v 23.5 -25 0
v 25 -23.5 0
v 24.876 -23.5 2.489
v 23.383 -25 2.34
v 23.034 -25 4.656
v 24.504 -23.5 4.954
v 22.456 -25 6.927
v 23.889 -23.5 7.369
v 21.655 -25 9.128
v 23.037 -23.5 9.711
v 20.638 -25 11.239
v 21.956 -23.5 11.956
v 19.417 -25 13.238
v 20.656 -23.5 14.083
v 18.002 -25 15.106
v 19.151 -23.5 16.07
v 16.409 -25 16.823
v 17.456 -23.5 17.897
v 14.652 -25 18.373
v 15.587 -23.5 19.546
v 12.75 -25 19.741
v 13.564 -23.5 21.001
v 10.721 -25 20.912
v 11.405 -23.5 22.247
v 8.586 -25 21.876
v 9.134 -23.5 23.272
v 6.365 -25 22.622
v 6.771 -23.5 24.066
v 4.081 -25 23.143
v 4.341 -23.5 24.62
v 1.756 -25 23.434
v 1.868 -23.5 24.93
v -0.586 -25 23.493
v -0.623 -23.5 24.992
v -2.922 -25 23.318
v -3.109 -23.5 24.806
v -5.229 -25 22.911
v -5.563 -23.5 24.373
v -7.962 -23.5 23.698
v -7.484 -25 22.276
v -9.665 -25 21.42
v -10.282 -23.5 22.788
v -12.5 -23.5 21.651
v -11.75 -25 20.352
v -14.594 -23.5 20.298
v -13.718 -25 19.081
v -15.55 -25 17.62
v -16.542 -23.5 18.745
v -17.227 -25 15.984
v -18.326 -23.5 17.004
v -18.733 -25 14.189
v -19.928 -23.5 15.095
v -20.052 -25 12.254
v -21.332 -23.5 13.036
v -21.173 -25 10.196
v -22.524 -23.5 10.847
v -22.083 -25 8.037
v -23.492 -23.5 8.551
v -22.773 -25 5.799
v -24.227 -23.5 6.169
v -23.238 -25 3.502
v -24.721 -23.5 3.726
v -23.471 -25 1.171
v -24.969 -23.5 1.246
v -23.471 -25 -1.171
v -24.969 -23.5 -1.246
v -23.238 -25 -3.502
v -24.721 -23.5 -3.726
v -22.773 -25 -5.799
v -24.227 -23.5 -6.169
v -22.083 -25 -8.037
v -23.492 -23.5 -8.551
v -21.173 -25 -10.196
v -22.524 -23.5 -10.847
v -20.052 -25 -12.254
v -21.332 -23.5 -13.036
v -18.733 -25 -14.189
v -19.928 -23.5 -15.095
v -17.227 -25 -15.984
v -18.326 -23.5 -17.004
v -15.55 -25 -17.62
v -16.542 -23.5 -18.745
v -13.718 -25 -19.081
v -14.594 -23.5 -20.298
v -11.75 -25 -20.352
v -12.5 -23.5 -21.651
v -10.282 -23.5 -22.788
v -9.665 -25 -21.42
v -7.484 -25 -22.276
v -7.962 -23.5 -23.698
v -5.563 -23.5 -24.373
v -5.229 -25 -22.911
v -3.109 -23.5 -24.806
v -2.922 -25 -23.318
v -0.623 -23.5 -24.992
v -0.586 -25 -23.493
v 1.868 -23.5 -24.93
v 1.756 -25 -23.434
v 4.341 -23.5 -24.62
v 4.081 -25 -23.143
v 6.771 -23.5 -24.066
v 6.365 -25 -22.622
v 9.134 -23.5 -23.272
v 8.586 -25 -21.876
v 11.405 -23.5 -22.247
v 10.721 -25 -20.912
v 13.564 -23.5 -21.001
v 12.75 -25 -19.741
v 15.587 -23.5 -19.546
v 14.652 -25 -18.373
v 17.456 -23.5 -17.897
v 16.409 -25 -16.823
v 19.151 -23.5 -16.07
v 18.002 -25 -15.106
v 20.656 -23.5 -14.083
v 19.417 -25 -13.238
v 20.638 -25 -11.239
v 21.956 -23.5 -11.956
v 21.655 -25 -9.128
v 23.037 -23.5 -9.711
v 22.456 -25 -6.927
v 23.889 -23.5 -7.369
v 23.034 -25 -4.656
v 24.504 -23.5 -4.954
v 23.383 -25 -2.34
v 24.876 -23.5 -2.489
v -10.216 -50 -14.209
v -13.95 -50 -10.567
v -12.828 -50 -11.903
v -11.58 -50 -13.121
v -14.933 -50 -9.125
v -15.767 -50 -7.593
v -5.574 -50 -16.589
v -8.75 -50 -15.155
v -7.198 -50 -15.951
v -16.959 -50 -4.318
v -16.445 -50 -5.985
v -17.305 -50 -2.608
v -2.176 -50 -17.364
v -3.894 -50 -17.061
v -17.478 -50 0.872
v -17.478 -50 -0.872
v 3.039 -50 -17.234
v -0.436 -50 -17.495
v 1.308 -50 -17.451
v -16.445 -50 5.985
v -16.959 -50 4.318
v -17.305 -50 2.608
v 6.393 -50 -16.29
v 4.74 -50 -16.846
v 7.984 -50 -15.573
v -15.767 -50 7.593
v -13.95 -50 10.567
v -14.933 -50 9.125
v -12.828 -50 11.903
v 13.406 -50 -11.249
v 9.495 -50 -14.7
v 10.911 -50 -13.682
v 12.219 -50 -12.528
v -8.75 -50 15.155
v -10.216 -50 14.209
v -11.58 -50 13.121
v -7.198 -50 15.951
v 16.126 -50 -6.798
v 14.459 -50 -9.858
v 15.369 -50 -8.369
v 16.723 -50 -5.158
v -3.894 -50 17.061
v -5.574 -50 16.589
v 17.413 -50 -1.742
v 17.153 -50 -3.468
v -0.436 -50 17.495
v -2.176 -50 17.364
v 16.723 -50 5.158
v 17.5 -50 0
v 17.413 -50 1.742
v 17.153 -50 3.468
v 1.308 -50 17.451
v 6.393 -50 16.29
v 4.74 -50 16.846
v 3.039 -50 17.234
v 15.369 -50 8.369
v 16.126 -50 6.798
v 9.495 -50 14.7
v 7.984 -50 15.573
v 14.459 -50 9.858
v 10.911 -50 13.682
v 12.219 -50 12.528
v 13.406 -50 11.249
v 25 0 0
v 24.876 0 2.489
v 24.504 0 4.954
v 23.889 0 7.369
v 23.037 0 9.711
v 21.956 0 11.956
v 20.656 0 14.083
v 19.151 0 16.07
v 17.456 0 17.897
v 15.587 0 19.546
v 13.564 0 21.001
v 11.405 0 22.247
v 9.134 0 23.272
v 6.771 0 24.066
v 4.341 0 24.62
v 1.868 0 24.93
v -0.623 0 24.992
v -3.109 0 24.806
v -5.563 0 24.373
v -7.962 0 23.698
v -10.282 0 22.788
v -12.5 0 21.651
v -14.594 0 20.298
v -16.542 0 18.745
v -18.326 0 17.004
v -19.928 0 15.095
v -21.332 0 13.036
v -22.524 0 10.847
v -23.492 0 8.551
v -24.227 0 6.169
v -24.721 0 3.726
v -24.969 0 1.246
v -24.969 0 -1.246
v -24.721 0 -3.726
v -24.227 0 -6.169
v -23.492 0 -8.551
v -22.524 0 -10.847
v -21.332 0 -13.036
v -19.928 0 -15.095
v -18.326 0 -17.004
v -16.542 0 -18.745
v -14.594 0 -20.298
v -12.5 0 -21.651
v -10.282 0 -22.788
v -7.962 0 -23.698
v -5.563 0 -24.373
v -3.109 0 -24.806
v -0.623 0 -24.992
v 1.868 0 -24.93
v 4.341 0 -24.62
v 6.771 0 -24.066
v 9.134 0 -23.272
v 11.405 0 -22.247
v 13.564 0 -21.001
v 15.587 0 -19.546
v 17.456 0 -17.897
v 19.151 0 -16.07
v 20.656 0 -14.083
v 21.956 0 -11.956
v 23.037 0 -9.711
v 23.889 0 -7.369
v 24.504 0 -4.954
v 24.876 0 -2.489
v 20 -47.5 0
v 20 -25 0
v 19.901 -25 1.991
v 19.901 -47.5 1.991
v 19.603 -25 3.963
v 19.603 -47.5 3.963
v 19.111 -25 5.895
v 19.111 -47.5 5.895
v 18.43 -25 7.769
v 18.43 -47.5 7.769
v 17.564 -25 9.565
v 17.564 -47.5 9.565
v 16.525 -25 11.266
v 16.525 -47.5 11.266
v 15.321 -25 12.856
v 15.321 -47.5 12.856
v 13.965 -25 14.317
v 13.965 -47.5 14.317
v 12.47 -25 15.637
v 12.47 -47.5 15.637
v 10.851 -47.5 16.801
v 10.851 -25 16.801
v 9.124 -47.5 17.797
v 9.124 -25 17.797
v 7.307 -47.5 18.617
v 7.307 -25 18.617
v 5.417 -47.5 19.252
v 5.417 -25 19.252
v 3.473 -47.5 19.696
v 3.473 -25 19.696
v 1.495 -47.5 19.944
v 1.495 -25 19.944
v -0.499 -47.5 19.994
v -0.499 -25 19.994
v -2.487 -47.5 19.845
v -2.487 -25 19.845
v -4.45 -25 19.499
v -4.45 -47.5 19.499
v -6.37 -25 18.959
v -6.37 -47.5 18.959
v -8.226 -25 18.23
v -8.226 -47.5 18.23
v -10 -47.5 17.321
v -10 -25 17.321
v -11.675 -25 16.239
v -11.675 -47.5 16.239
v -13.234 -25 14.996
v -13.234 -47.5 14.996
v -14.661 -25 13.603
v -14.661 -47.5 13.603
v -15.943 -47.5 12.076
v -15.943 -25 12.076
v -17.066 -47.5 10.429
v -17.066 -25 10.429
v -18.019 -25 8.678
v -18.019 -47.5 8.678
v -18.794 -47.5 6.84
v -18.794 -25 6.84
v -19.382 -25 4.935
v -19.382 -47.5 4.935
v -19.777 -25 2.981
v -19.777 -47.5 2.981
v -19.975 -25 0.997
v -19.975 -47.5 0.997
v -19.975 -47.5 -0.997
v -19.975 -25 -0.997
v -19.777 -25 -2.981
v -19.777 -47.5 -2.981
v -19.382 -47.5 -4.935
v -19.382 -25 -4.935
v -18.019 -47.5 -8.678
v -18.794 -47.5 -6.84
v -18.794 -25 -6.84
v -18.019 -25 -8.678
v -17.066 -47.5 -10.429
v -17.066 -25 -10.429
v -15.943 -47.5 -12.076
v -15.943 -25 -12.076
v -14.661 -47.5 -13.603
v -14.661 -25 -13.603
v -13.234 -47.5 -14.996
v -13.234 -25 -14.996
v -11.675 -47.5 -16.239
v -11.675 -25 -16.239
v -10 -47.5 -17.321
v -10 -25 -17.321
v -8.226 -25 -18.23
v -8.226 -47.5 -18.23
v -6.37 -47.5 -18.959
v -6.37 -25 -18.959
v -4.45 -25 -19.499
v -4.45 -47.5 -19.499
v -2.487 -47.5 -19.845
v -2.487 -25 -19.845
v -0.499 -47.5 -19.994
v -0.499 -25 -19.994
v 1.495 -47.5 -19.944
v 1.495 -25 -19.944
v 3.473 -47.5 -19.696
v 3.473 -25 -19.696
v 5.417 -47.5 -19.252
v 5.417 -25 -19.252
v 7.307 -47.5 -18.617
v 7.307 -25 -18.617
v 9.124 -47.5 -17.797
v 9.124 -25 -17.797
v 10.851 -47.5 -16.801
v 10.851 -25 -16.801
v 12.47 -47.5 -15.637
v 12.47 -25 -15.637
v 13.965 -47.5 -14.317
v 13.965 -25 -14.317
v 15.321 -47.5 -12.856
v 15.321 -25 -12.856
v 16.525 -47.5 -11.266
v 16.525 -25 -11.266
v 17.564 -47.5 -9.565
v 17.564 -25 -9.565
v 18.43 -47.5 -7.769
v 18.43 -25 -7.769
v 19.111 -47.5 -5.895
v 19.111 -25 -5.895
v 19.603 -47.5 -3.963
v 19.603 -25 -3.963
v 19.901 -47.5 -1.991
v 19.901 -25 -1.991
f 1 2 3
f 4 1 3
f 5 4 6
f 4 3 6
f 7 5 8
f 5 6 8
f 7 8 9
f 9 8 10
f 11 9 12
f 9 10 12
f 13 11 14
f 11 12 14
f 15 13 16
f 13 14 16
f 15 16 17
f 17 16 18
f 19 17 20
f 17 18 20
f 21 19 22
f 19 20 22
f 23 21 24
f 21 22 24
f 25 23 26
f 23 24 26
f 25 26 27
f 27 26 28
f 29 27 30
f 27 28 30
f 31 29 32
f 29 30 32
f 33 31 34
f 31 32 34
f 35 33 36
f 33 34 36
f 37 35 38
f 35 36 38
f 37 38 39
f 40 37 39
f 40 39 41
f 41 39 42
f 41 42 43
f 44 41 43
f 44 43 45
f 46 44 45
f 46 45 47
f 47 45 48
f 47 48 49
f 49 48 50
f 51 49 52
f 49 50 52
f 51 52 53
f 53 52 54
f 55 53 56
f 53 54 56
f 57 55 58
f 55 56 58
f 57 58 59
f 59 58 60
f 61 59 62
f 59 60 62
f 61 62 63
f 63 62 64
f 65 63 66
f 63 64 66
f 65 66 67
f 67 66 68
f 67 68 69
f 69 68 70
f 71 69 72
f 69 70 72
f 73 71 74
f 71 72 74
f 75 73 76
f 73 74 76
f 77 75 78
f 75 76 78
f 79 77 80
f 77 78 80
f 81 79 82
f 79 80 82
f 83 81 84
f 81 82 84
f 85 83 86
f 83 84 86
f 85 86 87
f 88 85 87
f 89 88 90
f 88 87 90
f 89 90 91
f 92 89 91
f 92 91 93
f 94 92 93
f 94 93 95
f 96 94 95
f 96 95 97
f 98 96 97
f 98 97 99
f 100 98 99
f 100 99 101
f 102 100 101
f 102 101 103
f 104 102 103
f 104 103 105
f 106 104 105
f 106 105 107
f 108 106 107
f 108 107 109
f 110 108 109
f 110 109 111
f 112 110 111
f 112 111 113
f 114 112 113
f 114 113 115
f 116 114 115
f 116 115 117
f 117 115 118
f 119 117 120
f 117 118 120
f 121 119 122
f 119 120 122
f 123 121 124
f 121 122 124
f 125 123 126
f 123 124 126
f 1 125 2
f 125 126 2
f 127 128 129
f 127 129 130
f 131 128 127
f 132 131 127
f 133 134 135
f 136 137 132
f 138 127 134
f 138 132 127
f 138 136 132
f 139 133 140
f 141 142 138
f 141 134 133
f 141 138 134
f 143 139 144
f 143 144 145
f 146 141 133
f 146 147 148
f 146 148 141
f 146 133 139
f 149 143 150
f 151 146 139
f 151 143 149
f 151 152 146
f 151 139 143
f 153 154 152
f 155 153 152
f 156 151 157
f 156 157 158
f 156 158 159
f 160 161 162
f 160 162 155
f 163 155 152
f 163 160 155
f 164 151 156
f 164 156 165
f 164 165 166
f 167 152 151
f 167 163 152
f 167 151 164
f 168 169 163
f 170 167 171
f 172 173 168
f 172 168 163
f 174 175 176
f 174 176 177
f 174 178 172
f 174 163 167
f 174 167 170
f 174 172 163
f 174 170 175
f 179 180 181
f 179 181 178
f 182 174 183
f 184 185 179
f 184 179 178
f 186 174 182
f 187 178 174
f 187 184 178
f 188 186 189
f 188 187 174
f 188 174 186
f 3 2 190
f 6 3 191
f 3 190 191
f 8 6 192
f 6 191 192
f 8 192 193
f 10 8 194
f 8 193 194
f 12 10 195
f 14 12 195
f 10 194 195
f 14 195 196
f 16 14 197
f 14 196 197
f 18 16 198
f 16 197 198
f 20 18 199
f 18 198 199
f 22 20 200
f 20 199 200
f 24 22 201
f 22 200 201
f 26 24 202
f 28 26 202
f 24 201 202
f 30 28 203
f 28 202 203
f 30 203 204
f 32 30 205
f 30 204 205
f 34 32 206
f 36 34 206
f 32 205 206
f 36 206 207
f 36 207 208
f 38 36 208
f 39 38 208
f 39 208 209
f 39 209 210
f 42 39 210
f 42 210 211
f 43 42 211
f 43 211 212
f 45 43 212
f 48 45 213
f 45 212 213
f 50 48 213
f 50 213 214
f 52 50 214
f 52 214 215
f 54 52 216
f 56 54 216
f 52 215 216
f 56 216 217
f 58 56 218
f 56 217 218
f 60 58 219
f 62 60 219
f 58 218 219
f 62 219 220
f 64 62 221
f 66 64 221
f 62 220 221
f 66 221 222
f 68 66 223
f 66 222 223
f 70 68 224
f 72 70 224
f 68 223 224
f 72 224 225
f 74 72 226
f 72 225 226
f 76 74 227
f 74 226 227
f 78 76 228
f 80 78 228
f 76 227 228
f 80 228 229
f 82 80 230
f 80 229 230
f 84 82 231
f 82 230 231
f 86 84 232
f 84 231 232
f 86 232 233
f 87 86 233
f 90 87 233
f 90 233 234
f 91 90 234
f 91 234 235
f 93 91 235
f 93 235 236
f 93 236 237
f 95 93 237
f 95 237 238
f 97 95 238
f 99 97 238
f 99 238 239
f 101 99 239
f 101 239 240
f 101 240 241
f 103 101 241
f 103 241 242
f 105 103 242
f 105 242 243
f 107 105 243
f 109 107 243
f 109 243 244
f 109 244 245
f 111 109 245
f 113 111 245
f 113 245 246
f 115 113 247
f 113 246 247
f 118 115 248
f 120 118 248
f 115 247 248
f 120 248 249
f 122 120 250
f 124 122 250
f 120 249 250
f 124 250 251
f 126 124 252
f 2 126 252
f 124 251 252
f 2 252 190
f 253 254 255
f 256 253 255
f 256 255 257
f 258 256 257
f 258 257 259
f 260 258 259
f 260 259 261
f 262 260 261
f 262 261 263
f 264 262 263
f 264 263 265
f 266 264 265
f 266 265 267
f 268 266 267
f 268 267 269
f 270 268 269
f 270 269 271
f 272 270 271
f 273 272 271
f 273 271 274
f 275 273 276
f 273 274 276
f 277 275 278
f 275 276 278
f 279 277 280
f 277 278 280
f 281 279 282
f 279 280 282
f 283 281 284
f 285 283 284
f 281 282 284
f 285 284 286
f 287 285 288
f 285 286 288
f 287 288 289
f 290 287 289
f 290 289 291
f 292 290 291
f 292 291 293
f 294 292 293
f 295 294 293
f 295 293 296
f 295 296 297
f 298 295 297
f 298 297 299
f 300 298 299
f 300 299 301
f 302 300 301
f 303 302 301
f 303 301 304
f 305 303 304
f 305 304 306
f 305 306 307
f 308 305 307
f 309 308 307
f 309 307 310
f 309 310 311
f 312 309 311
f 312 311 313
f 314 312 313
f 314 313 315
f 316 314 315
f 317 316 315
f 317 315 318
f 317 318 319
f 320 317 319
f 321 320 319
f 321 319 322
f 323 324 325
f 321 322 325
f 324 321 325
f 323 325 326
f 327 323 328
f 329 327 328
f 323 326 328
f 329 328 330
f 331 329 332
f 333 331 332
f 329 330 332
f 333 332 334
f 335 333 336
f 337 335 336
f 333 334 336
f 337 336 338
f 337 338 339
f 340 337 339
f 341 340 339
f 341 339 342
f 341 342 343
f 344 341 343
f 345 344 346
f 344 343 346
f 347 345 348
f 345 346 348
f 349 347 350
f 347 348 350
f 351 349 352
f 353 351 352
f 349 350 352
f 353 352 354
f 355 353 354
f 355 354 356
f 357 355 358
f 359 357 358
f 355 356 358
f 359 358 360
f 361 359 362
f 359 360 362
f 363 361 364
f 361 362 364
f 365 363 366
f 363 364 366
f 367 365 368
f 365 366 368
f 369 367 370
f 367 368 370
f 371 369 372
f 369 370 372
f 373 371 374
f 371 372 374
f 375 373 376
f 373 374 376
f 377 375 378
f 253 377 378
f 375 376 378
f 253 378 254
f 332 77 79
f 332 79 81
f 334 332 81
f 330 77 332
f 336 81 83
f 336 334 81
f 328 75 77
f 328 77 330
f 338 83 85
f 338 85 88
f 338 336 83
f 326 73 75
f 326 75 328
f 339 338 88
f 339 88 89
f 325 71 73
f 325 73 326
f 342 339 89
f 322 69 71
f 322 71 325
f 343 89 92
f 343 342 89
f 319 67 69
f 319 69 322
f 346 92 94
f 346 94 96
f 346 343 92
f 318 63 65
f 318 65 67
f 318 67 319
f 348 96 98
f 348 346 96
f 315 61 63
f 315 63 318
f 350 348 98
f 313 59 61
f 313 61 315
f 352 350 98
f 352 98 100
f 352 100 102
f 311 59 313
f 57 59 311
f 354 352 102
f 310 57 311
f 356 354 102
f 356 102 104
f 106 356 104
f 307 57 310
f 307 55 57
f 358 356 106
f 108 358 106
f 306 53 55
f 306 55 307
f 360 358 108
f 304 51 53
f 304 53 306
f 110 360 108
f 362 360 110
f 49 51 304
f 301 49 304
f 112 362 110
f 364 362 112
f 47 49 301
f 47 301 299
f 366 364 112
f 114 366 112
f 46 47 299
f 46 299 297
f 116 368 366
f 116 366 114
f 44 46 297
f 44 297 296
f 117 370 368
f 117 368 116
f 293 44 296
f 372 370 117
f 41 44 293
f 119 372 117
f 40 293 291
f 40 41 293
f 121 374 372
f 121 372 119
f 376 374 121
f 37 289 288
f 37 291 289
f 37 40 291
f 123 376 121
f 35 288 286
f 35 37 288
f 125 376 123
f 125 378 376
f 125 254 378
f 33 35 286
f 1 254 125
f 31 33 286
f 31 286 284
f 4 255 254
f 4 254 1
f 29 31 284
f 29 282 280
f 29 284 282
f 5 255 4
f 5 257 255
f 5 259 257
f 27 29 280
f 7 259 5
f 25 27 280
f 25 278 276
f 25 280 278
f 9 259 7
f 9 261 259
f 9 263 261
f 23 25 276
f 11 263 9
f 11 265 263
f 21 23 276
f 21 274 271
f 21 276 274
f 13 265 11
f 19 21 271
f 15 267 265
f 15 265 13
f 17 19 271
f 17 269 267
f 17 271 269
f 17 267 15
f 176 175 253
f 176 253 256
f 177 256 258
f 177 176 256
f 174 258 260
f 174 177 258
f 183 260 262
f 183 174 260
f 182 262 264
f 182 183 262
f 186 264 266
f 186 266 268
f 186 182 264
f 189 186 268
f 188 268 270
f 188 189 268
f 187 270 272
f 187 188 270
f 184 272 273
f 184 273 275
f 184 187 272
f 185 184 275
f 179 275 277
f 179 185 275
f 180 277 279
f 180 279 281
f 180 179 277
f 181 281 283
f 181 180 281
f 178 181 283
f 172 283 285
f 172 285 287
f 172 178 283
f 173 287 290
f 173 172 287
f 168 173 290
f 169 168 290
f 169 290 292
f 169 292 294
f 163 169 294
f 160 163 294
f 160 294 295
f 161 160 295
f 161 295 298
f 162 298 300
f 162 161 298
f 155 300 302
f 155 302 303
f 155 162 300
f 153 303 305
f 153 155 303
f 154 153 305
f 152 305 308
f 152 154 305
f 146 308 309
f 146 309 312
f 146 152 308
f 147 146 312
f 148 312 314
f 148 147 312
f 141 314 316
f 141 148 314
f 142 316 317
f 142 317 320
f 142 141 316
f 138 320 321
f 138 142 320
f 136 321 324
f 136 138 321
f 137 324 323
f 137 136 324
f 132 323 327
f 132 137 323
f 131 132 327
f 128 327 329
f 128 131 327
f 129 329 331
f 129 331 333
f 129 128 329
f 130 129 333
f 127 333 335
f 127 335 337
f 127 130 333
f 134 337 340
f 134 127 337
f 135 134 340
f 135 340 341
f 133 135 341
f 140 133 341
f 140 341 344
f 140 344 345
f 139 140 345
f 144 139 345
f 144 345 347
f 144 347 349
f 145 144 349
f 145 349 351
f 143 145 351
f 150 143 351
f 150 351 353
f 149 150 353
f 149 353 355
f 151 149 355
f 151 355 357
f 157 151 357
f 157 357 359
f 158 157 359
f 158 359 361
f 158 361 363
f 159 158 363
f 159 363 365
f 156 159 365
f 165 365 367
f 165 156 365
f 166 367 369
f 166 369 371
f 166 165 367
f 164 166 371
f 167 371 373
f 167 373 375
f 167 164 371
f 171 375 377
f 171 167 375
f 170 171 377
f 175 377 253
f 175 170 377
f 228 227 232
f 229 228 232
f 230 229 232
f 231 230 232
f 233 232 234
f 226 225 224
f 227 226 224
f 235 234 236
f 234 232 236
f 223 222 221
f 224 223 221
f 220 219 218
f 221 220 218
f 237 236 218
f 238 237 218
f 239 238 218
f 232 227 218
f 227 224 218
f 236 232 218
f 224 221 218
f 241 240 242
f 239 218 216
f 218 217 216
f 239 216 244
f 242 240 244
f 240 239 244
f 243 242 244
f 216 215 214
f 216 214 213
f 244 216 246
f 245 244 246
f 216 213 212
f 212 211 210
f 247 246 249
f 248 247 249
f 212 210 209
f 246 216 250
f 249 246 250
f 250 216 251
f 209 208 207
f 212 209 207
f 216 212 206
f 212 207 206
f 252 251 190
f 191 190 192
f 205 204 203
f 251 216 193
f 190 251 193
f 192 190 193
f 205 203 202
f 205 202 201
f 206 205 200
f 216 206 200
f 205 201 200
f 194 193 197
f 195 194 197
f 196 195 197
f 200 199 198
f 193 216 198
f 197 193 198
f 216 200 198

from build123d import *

# Parameters (mm, degrees)
F0_R     = 20
F1_DEPTH = 50
F0_R_2   = 25
F2_DEPTH = 25
F3_SIZE  = 2.5
F4_SIZE  = 1.5


with BuildPart() as f1:
    # F0 (on Front) → F1 (new body)
    with BuildSketch(Plane.XZ):
        Circle(F0_R)
    extrude(amount=F1_DEPTH)

    # F0 (on Front) → F2 (join)
    with BuildSketch(Plane.XZ):
        Circle(F0_R_2)
        Circle(F0_R, mode=Mode.SUBTRACT)
    extrude(amount=F2_DEPTH)

    # F3
    f3_edges = [f1.edges().sort_by_distance(p)[0] for p in [
        (-20, -50, 0),
    ]]
    chamfer(f3_edges, length=F3_SIZE)

    # F4
    f4_edges = [f1.edges().sort_by_distance(p)[0] for p in [
        (-25, -25, 0),
    ]]
    chamfer(f4_edges, length=F4_SIZE)


solid = f1.part
